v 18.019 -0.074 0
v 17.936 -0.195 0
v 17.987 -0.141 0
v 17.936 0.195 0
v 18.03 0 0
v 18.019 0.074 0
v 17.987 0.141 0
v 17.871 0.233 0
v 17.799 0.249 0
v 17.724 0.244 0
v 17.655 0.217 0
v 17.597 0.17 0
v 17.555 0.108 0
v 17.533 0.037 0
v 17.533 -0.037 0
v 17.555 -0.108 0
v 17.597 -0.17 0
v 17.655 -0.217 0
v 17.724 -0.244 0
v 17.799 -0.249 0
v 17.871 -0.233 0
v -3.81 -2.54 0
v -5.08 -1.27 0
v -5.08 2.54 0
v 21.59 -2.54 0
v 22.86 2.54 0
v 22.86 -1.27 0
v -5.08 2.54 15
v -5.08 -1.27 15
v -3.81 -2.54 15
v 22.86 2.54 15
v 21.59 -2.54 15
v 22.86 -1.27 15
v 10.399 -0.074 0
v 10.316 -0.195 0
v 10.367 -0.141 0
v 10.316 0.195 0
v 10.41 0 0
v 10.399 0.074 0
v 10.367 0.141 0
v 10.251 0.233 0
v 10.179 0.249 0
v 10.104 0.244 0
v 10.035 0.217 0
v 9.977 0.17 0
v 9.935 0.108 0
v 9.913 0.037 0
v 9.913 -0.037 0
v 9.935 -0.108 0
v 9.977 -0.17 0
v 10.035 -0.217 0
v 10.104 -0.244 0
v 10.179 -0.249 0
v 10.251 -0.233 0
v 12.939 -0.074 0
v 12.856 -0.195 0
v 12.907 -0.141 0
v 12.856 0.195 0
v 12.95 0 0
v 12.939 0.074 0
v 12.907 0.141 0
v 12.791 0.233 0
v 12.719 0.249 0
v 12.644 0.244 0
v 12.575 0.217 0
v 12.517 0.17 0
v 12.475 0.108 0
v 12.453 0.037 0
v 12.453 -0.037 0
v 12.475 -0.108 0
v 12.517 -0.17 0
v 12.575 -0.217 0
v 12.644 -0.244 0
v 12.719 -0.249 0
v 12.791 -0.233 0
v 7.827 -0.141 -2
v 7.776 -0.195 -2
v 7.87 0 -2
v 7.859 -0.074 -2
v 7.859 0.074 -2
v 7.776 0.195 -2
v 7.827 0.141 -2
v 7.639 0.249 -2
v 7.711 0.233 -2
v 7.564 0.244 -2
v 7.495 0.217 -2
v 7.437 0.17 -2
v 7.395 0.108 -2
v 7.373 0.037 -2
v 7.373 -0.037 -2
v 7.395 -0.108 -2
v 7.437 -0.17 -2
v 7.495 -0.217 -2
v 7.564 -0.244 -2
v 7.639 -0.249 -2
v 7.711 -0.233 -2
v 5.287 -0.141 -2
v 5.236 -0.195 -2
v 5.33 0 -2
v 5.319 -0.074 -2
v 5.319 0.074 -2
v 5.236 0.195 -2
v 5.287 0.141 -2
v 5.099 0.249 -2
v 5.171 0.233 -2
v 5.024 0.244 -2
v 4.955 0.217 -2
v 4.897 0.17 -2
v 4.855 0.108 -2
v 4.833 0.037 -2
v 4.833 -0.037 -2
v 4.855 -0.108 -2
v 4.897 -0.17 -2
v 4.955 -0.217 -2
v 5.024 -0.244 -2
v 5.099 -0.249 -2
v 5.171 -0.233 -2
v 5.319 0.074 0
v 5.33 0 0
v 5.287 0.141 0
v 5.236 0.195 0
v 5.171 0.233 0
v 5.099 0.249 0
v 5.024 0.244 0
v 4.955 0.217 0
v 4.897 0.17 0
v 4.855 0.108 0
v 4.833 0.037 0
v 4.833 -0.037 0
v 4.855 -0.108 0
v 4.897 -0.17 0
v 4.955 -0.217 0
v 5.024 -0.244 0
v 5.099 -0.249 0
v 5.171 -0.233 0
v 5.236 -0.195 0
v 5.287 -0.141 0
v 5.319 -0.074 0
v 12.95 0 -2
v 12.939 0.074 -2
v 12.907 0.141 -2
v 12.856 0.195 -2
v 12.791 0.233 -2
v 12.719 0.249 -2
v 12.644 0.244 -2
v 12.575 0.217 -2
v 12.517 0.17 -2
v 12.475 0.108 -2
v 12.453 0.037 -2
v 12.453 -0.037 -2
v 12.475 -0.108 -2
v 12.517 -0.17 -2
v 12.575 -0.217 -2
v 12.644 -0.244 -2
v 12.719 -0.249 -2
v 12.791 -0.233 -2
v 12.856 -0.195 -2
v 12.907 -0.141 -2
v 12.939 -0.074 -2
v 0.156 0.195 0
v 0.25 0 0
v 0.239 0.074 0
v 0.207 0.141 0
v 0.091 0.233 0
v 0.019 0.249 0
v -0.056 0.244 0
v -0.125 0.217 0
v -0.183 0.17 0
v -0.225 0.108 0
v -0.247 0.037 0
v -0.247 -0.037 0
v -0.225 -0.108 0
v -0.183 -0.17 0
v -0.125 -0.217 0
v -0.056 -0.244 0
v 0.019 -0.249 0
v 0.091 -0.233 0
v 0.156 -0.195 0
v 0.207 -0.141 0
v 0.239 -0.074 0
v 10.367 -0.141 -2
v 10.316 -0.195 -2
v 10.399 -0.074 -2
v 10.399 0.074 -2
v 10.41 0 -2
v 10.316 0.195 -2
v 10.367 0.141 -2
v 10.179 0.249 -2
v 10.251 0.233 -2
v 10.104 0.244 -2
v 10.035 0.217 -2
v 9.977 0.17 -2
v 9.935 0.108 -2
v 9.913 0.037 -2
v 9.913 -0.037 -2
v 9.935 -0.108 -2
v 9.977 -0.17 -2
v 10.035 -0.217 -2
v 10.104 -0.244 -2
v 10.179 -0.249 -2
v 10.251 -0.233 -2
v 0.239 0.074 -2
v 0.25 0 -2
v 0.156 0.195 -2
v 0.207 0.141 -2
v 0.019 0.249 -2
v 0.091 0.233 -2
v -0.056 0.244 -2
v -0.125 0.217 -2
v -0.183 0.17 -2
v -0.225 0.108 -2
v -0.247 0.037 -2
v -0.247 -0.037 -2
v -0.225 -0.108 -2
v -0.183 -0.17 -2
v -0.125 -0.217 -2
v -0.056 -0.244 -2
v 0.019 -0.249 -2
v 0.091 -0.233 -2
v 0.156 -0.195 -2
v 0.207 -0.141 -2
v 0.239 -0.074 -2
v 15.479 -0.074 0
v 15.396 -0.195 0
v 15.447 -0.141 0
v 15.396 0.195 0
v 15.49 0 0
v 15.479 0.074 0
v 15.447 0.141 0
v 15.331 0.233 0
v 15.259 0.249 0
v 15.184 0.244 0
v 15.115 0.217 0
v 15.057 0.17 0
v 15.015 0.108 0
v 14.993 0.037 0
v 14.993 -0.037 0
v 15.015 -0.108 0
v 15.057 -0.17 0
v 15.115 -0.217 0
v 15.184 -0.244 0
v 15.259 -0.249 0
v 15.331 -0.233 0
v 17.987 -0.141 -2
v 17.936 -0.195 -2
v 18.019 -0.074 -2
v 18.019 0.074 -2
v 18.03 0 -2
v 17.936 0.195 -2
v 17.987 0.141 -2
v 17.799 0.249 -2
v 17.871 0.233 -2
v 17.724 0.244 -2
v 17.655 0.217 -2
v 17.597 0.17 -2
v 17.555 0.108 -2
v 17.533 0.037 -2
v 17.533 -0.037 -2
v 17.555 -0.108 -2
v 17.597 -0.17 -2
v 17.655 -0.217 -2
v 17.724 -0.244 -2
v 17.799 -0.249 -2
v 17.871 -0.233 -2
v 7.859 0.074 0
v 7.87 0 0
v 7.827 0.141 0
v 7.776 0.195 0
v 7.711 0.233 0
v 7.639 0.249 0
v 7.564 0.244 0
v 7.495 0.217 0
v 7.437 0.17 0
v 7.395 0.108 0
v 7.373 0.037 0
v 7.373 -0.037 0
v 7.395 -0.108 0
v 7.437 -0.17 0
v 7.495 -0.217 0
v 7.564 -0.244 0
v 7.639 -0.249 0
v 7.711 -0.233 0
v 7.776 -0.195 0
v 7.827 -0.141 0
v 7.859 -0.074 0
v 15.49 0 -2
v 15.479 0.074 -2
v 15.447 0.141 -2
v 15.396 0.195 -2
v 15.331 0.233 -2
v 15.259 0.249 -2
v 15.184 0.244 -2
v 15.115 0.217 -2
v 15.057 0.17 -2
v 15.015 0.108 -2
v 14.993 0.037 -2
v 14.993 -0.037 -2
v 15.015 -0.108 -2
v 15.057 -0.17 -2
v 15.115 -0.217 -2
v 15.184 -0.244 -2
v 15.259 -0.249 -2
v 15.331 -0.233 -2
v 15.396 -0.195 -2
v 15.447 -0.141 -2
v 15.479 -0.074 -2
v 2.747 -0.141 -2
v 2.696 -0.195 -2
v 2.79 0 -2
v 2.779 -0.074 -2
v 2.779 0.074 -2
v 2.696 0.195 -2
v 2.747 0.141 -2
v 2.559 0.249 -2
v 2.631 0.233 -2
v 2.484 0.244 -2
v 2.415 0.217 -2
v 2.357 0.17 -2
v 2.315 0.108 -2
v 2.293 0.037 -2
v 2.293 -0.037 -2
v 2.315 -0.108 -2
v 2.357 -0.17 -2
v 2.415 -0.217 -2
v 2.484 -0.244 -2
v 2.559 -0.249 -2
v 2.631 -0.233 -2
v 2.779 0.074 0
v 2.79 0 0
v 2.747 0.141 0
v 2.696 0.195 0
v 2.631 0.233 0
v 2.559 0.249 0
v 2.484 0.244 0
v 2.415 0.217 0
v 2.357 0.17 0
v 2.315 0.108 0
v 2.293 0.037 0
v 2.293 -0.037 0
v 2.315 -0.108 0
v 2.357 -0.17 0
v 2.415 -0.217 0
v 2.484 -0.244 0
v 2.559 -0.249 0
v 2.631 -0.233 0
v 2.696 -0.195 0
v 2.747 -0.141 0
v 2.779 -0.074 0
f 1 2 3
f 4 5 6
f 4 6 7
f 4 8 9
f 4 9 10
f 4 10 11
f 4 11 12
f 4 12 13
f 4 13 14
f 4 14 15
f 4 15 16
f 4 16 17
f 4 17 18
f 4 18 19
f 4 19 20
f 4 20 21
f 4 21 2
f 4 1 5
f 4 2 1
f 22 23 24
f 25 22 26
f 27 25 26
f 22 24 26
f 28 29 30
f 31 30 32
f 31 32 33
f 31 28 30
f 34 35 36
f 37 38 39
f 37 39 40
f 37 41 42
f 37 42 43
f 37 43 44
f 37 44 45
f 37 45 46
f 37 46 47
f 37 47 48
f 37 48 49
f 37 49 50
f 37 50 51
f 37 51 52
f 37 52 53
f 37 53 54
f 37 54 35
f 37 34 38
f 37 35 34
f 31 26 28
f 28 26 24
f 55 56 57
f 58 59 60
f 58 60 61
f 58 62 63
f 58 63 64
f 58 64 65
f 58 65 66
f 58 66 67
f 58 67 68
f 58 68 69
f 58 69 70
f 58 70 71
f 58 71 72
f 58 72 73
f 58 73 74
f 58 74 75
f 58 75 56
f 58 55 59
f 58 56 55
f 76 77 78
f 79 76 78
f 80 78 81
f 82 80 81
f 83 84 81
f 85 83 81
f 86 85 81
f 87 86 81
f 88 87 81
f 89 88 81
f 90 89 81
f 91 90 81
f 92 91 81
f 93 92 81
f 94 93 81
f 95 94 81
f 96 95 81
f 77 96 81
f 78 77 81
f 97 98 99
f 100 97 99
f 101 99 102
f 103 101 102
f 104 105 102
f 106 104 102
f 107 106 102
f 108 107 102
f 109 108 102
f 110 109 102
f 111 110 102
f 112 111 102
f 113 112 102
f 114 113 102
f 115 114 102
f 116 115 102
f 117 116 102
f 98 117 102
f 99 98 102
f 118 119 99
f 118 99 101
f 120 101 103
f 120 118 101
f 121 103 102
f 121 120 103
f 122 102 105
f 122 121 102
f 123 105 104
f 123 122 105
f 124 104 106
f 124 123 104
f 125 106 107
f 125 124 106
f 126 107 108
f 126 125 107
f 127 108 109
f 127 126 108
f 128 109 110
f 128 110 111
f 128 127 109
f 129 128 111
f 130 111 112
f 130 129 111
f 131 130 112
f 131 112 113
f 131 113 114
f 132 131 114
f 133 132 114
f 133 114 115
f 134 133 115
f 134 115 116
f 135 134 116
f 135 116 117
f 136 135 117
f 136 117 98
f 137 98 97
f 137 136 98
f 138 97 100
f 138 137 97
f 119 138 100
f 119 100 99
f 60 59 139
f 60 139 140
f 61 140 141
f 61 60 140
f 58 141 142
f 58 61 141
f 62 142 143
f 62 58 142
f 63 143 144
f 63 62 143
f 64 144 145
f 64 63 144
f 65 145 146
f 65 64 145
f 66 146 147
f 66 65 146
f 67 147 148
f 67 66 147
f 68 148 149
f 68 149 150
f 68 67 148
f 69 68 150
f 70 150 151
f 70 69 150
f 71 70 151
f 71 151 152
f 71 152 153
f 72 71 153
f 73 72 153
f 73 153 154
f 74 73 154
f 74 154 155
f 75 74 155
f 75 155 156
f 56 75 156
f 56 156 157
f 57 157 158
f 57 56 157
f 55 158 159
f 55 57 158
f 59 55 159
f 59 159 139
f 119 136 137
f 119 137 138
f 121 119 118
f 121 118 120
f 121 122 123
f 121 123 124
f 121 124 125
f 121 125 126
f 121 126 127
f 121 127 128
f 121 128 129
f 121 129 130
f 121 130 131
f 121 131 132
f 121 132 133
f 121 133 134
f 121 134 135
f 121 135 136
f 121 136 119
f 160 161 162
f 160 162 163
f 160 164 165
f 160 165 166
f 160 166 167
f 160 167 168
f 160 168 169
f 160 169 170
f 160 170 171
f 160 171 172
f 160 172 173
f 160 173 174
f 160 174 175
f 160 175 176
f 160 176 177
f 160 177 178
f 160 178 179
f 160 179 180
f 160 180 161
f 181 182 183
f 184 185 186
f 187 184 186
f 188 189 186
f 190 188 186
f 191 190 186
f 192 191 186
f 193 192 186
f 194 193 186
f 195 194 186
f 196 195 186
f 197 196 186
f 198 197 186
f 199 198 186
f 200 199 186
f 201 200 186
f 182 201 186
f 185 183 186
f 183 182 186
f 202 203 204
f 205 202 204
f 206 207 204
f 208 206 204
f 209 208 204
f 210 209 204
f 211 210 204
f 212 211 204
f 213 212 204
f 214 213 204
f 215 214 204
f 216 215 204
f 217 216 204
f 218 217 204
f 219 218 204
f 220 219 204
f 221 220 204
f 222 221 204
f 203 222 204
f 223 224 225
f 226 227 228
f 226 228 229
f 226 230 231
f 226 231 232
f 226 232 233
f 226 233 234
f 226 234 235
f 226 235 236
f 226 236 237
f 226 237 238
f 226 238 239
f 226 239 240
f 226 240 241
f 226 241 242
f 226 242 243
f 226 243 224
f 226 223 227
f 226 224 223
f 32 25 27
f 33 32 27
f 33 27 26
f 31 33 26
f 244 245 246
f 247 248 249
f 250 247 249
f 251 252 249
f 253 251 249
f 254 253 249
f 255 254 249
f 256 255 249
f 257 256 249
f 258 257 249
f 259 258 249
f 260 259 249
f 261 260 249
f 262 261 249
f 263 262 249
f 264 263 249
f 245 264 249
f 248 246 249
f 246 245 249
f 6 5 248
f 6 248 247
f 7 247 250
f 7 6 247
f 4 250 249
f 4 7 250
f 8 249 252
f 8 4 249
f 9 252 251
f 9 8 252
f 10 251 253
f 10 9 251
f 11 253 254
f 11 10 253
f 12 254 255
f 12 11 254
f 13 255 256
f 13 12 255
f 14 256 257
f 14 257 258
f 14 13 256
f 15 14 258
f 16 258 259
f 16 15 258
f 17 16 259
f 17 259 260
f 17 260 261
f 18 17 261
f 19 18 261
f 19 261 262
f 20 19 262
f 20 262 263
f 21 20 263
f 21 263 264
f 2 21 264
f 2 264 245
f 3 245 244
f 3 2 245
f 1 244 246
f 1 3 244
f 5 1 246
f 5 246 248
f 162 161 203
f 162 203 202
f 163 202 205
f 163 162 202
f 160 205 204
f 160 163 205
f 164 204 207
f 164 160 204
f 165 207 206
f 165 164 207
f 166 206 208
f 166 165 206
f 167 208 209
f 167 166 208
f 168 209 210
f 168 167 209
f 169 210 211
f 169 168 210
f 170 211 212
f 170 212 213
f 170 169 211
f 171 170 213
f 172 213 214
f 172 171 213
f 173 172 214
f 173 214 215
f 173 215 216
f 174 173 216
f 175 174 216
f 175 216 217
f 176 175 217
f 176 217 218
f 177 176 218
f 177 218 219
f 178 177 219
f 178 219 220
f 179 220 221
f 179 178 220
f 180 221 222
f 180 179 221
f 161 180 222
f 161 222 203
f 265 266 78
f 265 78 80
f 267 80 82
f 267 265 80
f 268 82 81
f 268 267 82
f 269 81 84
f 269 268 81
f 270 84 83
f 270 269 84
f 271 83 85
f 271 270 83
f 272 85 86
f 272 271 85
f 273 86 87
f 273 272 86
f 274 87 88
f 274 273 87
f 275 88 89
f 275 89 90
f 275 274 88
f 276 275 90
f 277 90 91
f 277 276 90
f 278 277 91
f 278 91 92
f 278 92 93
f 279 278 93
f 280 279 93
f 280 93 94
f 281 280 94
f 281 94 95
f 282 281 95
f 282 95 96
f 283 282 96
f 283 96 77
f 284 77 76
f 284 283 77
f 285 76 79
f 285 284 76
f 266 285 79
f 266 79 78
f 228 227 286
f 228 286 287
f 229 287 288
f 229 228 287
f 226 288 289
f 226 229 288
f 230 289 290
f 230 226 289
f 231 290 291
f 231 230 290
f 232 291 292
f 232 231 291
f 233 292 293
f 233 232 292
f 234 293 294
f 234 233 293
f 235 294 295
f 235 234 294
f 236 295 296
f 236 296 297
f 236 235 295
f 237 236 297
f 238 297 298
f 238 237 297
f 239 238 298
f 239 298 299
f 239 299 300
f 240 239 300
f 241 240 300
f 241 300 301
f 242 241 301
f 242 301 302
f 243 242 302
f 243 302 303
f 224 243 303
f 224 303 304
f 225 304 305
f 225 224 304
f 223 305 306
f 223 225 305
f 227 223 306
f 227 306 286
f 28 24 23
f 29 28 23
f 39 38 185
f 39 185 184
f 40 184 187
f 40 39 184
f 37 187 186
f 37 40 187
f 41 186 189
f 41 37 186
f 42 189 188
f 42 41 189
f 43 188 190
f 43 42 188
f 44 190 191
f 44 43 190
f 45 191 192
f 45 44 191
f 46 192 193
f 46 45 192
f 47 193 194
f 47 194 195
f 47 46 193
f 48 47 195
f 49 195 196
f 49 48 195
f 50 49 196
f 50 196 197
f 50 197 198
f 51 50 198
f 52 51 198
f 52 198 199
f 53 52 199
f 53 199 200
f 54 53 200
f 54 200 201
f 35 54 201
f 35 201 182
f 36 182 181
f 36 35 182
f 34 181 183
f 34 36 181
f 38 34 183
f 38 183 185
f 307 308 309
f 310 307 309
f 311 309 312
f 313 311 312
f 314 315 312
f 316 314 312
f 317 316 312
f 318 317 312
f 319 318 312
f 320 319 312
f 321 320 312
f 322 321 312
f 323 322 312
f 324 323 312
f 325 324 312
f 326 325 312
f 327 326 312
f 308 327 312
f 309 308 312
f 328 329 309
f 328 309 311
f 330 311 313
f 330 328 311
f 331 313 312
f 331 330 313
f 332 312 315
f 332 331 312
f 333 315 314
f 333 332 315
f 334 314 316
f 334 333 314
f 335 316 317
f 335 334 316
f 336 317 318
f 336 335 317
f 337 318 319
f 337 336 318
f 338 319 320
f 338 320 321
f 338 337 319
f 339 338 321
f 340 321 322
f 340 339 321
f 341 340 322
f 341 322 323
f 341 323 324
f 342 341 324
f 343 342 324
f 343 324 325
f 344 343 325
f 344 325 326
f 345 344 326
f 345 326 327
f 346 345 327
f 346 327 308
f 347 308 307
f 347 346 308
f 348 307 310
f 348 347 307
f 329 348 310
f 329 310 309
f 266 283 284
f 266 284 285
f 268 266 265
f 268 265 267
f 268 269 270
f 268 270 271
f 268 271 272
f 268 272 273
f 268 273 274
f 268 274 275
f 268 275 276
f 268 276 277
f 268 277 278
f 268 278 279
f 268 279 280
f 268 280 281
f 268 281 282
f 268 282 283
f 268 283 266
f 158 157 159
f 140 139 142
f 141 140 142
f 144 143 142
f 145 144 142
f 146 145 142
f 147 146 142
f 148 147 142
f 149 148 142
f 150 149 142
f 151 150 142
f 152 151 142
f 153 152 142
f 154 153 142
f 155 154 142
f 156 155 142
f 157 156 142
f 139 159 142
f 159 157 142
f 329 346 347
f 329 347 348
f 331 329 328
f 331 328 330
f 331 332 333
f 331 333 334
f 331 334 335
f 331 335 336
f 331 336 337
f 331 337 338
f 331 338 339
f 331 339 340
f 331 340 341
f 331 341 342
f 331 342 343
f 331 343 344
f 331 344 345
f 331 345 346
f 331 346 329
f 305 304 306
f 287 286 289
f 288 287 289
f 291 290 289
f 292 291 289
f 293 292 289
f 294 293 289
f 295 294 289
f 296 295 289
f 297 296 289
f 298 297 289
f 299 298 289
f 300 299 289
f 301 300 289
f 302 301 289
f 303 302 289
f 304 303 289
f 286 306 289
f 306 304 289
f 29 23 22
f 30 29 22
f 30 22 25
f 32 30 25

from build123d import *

# Parameters (mm, degrees)
COMPONENT_OUTLINE_DEPTH = 15
SKETCH2_R               = 0.25
EXTRUDE_1_DEPTH         = 2
SKETCH3_R               = 0.25
EXTRUDE_2_DEPTH         = 2
SKETCH4_R               = 0.25
EXTRUDE_3_DEPTH         = 2
SKETCH5_R               = 0.25
EXTRUDE_4_DEPTH         = 2
SKETCH6_R               = 0.25
EXTRUDE_5_DEPTH         = 2
SKETCH7_R               = 0.25
EXTRUDE_6_DEPTH         = 2
SKETCH8_R               = 0.25
EXTRUDE_7_DEPTH         = 2
SKETCH9_R               = 0.25
EXTRUDE_8_DEPTH         = 2


with BuildPart() as part:
    # Sketch1 → Component_Outline (new body)
    with BuildSketch(Plane.XY):
        Polygon((-5.08, 2.54), (-5.08, -1.27), (-3.81, -2.54), (21.59, -2.54), (22.86, -1.27), (22.86, 2.54), align=None)
    extrude(amount=COMPONENT_OUTLINE_DEPTH)


with BuildPart() as body_2:
    # Sketch2 → Extrude 1 (new body)
    with BuildSketch(Plane.XY):
        Circle(SKETCH2_R)
    extrude(amount=-EXTRUDE_1_DEPTH)


with BuildPart() as body_3:
    # Sketch3 → Extrude 2 (new body)
    with BuildSketch(Plane.XY):
        with Locations((2.54, 0)):
            Circle(SKETCH3_R)
    extrude(amount=-EXTRUDE_2_DEPTH)


with BuildPart() as body_4:
    # Sketch4 → Extrude 3 (new body)
    with BuildSketch(Plane.XY):
        with Locations((5.08, 0)):
            Circle(SKETCH4_R)
    extrude(amount=-EXTRUDE_3_DEPTH)


with BuildPart() as body_5:
    # Sketch5 → Extrude 4 (new body)
    with BuildSketch(Plane.XY):
        with Locations((7.62, 0)):
            Circle(SKETCH5_R)
    extrude(amount=-EXTRUDE_4_DEPTH)


with BuildPart() as body_6:
    # Sketch6 → Extrude 5 (new body)
    with BuildSketch(Plane.XY):
        with Locations((10.16, 0)):
            Circle(SKETCH6_R)
    extrude(amount=-EXTRUDE_5_DEPTH)


with BuildPart() as body_7:
    # Sketch7 → Extrude 6 (new body)
    with BuildSketch(Plane.XY):
        with Locations((12.7, 0)):
            Circle(SKETCH7_R)
    extrude(amount=-EXTRUDE_6_DEPTH)


with BuildPart() as body_8:
    # Sketch8 → Extrude 7 (new body)
    with BuildSketch(Plane.XY):
        with Locations((15.24, 0)):
            Circle(SKETCH8_R)
    extrude(amount=-EXTRUDE_7_DEPTH)


with BuildPart() as body_9:
    # Sketch9 → Extrude 8 (new body)
    with BuildSketch(Plane.XY):
        with Locations((17.78, 0)):
            Circle(SKETCH9_R)
    extrude(amount=-EXTRUDE_8_DEPTH)


solid = Compound([part.part, body_2.part, body_3.part, body_4.part, body_5.part, body_6.part, body_7.part, body_8.part, body_9.part])
